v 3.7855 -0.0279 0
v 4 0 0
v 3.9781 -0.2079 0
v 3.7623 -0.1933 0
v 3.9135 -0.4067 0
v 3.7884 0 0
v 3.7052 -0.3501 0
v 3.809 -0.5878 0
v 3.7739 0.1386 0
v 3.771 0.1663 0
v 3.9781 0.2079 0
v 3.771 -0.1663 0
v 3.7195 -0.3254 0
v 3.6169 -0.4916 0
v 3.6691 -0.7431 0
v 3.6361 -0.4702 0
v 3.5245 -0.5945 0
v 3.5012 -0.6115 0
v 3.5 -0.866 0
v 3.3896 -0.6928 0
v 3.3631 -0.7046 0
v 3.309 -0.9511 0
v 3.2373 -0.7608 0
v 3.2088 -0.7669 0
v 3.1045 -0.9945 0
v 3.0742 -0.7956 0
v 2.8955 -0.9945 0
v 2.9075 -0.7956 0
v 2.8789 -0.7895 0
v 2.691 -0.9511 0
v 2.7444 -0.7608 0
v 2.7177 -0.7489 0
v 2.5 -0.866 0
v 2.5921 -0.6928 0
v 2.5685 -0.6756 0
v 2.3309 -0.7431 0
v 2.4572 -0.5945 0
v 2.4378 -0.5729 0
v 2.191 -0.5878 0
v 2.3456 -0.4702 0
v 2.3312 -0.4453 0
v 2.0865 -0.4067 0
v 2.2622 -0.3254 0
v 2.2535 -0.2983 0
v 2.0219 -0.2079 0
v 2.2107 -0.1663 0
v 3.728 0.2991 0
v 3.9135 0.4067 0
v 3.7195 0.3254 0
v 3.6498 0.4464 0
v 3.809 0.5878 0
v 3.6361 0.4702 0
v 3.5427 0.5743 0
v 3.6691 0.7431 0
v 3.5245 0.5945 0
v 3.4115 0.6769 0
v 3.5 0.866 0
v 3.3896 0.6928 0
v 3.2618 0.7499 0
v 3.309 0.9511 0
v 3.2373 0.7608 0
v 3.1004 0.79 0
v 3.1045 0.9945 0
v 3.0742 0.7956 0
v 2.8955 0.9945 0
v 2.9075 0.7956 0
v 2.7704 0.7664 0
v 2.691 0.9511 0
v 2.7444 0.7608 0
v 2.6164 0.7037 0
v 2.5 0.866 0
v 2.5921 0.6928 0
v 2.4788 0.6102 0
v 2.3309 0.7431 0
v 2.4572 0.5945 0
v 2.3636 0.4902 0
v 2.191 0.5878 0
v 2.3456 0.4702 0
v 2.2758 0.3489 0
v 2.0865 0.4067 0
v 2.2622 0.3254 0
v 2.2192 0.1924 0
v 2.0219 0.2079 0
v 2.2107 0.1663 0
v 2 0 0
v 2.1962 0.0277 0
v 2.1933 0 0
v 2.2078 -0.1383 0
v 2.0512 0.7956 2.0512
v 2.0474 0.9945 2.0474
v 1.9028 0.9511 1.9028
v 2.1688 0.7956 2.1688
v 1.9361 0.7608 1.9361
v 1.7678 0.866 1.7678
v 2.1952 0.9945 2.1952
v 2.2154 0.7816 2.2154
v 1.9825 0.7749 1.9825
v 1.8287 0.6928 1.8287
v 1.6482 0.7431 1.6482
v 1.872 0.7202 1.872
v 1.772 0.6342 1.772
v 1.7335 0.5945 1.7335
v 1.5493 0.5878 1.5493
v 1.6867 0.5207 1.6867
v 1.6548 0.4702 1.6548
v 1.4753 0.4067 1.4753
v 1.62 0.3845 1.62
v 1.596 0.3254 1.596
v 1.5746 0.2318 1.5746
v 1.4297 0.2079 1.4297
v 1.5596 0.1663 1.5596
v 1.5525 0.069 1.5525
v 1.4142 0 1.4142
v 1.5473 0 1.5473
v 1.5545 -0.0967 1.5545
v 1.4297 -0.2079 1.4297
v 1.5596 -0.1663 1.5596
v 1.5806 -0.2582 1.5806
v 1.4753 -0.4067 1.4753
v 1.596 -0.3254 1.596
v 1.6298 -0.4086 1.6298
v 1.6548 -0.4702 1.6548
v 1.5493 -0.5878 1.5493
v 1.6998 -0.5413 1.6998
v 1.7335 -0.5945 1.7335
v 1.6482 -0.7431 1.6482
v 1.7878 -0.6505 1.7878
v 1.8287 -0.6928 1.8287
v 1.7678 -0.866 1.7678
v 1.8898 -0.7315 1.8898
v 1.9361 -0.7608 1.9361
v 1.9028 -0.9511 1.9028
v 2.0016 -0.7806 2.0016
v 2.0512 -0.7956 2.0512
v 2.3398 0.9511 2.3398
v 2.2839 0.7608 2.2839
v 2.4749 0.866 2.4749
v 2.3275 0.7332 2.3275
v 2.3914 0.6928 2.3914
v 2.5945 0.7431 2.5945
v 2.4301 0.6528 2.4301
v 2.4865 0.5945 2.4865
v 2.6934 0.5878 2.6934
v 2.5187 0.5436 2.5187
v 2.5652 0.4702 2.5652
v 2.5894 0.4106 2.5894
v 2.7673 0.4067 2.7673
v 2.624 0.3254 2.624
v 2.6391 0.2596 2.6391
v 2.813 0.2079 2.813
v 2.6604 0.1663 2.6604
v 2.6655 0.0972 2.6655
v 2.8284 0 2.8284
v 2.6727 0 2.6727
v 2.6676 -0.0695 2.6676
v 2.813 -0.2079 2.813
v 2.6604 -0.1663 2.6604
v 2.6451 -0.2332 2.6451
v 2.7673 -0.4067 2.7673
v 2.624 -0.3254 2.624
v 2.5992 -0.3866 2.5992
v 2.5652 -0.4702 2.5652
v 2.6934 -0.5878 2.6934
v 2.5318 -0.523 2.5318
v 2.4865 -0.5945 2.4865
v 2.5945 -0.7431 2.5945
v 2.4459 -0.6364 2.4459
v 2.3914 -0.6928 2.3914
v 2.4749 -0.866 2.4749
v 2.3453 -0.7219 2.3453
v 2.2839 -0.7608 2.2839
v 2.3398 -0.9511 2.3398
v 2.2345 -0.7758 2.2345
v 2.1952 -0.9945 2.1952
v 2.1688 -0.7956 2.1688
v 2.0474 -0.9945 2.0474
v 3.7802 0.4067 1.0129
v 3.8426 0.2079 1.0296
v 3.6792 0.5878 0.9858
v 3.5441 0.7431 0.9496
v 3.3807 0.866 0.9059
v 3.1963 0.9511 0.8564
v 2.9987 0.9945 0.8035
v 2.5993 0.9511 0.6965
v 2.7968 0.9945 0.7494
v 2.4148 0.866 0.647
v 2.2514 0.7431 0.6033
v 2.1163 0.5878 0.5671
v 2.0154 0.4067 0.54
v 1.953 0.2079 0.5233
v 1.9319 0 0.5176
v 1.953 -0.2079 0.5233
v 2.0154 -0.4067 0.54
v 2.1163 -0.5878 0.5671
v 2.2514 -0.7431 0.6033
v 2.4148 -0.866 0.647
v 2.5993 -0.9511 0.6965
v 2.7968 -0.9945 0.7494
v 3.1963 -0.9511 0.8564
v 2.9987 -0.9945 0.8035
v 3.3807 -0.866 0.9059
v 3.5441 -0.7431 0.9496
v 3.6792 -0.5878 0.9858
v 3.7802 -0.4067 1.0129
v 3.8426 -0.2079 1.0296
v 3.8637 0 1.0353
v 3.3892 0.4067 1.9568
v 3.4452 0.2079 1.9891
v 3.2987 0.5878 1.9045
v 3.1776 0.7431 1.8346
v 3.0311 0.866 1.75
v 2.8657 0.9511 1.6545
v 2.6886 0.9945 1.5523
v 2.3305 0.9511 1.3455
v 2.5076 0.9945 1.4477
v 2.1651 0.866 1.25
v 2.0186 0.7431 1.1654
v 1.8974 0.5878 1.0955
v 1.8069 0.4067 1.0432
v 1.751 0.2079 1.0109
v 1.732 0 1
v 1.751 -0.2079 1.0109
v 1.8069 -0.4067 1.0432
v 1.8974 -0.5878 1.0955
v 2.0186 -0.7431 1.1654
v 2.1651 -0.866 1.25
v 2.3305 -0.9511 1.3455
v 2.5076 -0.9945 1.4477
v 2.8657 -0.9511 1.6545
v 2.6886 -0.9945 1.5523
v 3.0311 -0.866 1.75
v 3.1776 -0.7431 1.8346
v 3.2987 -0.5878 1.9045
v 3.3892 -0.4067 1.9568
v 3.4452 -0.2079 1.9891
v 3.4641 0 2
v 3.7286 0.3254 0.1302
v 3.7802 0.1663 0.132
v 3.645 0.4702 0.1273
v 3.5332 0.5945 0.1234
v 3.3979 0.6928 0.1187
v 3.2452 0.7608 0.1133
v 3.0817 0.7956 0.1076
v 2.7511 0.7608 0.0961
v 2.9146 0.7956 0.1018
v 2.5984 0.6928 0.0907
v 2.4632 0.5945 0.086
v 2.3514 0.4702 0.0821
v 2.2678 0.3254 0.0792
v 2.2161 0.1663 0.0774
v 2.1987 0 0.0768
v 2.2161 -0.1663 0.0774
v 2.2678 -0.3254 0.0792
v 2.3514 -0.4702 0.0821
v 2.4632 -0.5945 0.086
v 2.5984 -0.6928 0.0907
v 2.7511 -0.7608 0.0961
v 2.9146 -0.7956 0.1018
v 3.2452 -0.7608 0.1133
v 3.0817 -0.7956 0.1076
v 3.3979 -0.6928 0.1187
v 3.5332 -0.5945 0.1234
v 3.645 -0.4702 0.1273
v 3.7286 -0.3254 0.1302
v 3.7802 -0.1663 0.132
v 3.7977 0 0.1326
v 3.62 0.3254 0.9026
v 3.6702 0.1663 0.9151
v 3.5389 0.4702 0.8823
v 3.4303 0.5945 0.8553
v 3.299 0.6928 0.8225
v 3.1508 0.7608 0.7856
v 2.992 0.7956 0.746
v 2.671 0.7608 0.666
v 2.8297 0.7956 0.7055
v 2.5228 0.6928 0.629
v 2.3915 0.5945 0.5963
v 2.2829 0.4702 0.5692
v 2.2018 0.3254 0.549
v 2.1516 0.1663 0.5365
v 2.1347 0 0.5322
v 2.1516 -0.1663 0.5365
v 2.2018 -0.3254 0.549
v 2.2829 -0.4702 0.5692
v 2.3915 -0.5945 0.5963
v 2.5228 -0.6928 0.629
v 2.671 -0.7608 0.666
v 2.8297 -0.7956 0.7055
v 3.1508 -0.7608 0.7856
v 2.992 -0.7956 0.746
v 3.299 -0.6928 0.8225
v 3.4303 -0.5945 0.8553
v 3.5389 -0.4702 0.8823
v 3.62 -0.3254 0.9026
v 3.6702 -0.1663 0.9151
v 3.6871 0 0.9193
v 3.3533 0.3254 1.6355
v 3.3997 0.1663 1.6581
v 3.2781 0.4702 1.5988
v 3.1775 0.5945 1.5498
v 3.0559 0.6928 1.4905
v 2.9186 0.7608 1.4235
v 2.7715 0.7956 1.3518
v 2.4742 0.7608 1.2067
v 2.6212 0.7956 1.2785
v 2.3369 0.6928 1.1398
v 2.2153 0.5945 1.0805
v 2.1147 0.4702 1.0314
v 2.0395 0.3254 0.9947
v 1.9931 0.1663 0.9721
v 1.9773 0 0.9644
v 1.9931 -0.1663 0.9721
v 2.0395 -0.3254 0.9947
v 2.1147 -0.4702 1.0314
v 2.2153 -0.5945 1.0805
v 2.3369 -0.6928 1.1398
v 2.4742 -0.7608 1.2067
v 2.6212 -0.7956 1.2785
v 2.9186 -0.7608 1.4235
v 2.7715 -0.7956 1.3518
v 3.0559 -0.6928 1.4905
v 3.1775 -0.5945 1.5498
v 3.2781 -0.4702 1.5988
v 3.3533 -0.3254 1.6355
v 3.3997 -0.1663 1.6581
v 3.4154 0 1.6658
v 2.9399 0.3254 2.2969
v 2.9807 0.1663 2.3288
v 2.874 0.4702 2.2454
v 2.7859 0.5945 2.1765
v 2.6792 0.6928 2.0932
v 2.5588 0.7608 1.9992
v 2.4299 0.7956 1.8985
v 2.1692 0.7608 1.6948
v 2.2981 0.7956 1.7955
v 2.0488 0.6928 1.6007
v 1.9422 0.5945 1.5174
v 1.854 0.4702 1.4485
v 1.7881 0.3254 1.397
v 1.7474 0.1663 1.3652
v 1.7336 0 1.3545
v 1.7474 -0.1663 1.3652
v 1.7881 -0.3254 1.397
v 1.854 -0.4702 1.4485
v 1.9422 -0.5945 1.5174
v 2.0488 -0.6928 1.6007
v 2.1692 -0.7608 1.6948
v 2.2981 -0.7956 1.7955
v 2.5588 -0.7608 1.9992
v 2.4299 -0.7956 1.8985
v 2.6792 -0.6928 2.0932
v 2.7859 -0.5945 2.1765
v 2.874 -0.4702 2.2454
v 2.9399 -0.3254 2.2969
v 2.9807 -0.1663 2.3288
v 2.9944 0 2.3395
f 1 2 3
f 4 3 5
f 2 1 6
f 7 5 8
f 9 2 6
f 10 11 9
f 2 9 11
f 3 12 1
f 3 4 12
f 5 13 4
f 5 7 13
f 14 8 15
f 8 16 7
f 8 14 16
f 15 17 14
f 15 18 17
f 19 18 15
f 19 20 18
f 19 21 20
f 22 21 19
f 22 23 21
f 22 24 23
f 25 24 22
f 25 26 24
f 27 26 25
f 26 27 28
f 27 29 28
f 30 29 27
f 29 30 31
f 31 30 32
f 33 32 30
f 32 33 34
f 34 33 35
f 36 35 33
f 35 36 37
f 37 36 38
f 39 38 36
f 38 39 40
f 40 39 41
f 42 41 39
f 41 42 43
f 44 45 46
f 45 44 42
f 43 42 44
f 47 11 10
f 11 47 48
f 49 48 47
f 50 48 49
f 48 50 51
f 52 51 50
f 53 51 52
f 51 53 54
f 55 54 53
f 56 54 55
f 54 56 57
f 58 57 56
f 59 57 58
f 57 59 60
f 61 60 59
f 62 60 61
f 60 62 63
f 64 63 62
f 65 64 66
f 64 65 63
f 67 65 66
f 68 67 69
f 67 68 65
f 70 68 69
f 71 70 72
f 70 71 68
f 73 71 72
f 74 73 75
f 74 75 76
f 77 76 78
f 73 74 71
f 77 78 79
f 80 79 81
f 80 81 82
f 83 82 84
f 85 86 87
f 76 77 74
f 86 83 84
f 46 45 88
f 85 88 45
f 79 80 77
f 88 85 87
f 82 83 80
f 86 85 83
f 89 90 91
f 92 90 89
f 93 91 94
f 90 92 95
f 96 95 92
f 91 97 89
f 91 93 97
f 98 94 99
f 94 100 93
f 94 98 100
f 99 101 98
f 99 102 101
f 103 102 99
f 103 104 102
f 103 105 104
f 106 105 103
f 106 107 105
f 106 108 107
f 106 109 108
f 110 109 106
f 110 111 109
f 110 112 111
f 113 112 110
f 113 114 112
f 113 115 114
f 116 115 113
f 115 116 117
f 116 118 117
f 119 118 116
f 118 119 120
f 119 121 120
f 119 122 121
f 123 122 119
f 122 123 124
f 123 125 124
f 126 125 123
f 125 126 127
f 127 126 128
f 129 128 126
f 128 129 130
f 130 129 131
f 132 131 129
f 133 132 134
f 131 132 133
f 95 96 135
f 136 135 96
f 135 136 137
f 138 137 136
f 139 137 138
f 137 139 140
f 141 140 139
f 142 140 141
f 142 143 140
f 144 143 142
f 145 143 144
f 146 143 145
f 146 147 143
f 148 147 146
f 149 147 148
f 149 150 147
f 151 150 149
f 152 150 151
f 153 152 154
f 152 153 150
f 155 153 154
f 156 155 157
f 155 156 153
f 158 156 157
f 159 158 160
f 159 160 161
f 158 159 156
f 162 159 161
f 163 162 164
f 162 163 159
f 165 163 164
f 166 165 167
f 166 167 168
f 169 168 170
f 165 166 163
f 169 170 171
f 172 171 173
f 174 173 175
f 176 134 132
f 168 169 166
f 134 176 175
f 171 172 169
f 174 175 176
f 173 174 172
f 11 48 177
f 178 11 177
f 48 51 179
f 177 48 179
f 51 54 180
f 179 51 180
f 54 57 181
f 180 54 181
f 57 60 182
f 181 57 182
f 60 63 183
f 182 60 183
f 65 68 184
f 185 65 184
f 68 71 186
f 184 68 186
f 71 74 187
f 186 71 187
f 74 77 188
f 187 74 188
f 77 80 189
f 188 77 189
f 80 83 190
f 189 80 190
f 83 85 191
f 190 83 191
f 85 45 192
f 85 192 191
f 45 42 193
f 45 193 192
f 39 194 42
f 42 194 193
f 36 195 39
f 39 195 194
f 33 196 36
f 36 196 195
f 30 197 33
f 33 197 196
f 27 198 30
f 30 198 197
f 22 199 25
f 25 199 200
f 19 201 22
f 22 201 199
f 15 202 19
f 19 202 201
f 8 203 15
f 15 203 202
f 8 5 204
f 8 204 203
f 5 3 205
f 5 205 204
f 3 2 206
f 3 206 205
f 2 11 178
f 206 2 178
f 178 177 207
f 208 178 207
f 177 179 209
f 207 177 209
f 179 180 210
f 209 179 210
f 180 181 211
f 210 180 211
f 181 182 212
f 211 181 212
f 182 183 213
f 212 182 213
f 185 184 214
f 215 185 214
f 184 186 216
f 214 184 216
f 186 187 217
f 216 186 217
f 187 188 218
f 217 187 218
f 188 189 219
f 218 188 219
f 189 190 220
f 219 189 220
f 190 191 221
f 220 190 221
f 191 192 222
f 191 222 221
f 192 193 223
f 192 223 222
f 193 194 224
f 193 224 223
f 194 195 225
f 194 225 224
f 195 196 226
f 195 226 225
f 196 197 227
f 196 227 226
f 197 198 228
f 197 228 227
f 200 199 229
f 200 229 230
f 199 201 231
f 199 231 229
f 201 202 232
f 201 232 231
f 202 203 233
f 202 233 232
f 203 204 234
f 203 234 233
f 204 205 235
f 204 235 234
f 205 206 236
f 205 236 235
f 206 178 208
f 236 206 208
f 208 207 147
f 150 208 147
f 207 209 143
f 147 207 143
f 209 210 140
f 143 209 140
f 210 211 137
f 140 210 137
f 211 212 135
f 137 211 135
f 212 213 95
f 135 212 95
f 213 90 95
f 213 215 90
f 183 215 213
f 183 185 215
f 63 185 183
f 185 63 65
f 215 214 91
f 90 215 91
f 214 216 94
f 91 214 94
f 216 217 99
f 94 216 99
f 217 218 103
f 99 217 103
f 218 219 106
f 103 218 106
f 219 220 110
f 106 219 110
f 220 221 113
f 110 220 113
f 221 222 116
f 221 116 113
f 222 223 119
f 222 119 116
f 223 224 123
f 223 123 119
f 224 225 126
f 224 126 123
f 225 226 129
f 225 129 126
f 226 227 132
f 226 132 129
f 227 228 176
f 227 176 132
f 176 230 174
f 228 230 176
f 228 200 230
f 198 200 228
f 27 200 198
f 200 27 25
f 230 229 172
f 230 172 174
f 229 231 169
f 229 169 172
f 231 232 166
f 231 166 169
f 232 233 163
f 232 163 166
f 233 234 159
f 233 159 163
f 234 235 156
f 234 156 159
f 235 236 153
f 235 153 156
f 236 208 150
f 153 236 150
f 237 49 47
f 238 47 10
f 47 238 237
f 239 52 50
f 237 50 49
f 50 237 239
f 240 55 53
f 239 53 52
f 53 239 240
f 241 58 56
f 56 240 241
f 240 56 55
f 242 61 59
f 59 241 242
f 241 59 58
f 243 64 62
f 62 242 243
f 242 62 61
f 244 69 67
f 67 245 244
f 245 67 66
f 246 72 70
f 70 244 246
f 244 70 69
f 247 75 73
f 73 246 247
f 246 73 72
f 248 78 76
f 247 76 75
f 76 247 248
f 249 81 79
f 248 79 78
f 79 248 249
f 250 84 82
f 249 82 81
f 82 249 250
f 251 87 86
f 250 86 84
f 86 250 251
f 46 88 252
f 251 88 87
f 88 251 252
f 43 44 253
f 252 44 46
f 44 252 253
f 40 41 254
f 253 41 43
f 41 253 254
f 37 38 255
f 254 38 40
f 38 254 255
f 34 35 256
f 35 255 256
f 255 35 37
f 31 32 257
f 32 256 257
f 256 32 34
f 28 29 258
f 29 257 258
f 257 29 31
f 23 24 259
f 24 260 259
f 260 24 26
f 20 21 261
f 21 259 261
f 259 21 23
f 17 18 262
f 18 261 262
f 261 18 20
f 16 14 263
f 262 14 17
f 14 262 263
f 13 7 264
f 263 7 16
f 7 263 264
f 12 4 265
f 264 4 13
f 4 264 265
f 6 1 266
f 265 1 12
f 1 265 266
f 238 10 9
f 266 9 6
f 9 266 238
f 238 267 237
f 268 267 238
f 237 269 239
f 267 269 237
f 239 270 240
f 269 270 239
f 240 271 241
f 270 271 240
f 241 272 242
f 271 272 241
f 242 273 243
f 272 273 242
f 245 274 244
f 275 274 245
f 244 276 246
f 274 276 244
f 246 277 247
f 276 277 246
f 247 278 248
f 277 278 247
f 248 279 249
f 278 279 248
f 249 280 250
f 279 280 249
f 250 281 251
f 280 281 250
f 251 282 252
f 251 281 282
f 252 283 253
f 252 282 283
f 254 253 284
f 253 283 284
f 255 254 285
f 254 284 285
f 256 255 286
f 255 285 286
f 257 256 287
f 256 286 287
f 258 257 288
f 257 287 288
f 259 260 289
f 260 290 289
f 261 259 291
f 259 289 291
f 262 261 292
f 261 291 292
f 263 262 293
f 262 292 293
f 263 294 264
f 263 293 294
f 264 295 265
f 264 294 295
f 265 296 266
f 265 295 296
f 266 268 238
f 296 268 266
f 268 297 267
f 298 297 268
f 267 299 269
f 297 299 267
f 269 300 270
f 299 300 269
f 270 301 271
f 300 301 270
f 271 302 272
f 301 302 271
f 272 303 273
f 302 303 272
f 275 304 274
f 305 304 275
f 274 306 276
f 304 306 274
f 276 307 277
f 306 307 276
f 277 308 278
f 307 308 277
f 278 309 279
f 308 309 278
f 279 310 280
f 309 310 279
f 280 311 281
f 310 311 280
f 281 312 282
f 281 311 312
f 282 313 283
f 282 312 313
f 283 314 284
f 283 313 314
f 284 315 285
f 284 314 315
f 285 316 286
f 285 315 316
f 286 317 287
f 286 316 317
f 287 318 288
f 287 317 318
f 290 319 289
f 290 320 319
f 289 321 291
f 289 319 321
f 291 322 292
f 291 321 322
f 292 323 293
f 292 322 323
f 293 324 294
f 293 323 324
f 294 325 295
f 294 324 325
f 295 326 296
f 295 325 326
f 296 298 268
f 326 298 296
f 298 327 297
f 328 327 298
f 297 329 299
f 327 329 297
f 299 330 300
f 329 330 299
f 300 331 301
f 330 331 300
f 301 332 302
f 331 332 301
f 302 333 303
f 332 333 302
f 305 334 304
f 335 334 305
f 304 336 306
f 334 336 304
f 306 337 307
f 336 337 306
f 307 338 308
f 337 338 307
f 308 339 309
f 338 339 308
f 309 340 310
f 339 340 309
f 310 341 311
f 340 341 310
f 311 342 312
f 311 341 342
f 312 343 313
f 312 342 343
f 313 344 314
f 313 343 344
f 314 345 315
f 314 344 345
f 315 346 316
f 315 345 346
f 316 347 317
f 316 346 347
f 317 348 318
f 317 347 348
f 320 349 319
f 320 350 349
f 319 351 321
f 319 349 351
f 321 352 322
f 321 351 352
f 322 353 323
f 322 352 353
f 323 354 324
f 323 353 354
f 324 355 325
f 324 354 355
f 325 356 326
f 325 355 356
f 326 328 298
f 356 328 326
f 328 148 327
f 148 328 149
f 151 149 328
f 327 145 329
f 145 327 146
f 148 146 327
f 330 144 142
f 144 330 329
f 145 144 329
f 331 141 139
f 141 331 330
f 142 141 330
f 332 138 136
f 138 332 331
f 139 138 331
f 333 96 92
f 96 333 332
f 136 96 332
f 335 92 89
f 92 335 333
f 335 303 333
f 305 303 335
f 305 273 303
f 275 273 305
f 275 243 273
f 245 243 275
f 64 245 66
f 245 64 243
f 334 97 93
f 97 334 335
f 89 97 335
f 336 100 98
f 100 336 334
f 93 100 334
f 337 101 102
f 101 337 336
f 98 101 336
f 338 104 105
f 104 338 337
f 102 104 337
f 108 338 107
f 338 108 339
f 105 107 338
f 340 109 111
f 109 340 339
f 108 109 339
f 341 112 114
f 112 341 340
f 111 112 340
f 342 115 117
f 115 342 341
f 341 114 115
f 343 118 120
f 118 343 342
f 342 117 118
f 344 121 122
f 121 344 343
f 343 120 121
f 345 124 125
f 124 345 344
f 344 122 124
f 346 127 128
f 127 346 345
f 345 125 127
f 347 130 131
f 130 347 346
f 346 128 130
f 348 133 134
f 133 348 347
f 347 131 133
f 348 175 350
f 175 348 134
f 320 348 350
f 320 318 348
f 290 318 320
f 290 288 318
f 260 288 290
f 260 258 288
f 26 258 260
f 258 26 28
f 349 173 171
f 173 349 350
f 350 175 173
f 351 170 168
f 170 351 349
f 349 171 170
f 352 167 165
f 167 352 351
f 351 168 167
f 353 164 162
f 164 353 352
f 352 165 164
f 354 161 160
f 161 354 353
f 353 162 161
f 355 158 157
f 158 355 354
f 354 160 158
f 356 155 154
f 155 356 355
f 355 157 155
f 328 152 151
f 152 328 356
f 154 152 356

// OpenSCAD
// Nicolì Angelo 2023 - THIS CODE IS LICENSED AS GPL-2.0

module pipe(raggio,angolo){
rotate([90,0,0])
rotate_extrude(angle=angolo, $fn = $preview? 90: 30) 
translate([3, 0, 0])
circle(r = raggio, $fn = $preview? 90: 30);
}

difference(){
   translate([0,0])
   pipe(1,45);
   
   rotate([0,10,0])
   translate([0,0])
   pipe(0.8,60);
 }


module repeat(){
difference(){
 for (i =[-1:1]){
     translate([0,5*i,0])
     ring(1,90);
 }
 
 for (i =[-1:1]){
    rotate([0,10,0])
     translate([0,5*i,0])
     ring(0.8,110);
 }
 
}
}
